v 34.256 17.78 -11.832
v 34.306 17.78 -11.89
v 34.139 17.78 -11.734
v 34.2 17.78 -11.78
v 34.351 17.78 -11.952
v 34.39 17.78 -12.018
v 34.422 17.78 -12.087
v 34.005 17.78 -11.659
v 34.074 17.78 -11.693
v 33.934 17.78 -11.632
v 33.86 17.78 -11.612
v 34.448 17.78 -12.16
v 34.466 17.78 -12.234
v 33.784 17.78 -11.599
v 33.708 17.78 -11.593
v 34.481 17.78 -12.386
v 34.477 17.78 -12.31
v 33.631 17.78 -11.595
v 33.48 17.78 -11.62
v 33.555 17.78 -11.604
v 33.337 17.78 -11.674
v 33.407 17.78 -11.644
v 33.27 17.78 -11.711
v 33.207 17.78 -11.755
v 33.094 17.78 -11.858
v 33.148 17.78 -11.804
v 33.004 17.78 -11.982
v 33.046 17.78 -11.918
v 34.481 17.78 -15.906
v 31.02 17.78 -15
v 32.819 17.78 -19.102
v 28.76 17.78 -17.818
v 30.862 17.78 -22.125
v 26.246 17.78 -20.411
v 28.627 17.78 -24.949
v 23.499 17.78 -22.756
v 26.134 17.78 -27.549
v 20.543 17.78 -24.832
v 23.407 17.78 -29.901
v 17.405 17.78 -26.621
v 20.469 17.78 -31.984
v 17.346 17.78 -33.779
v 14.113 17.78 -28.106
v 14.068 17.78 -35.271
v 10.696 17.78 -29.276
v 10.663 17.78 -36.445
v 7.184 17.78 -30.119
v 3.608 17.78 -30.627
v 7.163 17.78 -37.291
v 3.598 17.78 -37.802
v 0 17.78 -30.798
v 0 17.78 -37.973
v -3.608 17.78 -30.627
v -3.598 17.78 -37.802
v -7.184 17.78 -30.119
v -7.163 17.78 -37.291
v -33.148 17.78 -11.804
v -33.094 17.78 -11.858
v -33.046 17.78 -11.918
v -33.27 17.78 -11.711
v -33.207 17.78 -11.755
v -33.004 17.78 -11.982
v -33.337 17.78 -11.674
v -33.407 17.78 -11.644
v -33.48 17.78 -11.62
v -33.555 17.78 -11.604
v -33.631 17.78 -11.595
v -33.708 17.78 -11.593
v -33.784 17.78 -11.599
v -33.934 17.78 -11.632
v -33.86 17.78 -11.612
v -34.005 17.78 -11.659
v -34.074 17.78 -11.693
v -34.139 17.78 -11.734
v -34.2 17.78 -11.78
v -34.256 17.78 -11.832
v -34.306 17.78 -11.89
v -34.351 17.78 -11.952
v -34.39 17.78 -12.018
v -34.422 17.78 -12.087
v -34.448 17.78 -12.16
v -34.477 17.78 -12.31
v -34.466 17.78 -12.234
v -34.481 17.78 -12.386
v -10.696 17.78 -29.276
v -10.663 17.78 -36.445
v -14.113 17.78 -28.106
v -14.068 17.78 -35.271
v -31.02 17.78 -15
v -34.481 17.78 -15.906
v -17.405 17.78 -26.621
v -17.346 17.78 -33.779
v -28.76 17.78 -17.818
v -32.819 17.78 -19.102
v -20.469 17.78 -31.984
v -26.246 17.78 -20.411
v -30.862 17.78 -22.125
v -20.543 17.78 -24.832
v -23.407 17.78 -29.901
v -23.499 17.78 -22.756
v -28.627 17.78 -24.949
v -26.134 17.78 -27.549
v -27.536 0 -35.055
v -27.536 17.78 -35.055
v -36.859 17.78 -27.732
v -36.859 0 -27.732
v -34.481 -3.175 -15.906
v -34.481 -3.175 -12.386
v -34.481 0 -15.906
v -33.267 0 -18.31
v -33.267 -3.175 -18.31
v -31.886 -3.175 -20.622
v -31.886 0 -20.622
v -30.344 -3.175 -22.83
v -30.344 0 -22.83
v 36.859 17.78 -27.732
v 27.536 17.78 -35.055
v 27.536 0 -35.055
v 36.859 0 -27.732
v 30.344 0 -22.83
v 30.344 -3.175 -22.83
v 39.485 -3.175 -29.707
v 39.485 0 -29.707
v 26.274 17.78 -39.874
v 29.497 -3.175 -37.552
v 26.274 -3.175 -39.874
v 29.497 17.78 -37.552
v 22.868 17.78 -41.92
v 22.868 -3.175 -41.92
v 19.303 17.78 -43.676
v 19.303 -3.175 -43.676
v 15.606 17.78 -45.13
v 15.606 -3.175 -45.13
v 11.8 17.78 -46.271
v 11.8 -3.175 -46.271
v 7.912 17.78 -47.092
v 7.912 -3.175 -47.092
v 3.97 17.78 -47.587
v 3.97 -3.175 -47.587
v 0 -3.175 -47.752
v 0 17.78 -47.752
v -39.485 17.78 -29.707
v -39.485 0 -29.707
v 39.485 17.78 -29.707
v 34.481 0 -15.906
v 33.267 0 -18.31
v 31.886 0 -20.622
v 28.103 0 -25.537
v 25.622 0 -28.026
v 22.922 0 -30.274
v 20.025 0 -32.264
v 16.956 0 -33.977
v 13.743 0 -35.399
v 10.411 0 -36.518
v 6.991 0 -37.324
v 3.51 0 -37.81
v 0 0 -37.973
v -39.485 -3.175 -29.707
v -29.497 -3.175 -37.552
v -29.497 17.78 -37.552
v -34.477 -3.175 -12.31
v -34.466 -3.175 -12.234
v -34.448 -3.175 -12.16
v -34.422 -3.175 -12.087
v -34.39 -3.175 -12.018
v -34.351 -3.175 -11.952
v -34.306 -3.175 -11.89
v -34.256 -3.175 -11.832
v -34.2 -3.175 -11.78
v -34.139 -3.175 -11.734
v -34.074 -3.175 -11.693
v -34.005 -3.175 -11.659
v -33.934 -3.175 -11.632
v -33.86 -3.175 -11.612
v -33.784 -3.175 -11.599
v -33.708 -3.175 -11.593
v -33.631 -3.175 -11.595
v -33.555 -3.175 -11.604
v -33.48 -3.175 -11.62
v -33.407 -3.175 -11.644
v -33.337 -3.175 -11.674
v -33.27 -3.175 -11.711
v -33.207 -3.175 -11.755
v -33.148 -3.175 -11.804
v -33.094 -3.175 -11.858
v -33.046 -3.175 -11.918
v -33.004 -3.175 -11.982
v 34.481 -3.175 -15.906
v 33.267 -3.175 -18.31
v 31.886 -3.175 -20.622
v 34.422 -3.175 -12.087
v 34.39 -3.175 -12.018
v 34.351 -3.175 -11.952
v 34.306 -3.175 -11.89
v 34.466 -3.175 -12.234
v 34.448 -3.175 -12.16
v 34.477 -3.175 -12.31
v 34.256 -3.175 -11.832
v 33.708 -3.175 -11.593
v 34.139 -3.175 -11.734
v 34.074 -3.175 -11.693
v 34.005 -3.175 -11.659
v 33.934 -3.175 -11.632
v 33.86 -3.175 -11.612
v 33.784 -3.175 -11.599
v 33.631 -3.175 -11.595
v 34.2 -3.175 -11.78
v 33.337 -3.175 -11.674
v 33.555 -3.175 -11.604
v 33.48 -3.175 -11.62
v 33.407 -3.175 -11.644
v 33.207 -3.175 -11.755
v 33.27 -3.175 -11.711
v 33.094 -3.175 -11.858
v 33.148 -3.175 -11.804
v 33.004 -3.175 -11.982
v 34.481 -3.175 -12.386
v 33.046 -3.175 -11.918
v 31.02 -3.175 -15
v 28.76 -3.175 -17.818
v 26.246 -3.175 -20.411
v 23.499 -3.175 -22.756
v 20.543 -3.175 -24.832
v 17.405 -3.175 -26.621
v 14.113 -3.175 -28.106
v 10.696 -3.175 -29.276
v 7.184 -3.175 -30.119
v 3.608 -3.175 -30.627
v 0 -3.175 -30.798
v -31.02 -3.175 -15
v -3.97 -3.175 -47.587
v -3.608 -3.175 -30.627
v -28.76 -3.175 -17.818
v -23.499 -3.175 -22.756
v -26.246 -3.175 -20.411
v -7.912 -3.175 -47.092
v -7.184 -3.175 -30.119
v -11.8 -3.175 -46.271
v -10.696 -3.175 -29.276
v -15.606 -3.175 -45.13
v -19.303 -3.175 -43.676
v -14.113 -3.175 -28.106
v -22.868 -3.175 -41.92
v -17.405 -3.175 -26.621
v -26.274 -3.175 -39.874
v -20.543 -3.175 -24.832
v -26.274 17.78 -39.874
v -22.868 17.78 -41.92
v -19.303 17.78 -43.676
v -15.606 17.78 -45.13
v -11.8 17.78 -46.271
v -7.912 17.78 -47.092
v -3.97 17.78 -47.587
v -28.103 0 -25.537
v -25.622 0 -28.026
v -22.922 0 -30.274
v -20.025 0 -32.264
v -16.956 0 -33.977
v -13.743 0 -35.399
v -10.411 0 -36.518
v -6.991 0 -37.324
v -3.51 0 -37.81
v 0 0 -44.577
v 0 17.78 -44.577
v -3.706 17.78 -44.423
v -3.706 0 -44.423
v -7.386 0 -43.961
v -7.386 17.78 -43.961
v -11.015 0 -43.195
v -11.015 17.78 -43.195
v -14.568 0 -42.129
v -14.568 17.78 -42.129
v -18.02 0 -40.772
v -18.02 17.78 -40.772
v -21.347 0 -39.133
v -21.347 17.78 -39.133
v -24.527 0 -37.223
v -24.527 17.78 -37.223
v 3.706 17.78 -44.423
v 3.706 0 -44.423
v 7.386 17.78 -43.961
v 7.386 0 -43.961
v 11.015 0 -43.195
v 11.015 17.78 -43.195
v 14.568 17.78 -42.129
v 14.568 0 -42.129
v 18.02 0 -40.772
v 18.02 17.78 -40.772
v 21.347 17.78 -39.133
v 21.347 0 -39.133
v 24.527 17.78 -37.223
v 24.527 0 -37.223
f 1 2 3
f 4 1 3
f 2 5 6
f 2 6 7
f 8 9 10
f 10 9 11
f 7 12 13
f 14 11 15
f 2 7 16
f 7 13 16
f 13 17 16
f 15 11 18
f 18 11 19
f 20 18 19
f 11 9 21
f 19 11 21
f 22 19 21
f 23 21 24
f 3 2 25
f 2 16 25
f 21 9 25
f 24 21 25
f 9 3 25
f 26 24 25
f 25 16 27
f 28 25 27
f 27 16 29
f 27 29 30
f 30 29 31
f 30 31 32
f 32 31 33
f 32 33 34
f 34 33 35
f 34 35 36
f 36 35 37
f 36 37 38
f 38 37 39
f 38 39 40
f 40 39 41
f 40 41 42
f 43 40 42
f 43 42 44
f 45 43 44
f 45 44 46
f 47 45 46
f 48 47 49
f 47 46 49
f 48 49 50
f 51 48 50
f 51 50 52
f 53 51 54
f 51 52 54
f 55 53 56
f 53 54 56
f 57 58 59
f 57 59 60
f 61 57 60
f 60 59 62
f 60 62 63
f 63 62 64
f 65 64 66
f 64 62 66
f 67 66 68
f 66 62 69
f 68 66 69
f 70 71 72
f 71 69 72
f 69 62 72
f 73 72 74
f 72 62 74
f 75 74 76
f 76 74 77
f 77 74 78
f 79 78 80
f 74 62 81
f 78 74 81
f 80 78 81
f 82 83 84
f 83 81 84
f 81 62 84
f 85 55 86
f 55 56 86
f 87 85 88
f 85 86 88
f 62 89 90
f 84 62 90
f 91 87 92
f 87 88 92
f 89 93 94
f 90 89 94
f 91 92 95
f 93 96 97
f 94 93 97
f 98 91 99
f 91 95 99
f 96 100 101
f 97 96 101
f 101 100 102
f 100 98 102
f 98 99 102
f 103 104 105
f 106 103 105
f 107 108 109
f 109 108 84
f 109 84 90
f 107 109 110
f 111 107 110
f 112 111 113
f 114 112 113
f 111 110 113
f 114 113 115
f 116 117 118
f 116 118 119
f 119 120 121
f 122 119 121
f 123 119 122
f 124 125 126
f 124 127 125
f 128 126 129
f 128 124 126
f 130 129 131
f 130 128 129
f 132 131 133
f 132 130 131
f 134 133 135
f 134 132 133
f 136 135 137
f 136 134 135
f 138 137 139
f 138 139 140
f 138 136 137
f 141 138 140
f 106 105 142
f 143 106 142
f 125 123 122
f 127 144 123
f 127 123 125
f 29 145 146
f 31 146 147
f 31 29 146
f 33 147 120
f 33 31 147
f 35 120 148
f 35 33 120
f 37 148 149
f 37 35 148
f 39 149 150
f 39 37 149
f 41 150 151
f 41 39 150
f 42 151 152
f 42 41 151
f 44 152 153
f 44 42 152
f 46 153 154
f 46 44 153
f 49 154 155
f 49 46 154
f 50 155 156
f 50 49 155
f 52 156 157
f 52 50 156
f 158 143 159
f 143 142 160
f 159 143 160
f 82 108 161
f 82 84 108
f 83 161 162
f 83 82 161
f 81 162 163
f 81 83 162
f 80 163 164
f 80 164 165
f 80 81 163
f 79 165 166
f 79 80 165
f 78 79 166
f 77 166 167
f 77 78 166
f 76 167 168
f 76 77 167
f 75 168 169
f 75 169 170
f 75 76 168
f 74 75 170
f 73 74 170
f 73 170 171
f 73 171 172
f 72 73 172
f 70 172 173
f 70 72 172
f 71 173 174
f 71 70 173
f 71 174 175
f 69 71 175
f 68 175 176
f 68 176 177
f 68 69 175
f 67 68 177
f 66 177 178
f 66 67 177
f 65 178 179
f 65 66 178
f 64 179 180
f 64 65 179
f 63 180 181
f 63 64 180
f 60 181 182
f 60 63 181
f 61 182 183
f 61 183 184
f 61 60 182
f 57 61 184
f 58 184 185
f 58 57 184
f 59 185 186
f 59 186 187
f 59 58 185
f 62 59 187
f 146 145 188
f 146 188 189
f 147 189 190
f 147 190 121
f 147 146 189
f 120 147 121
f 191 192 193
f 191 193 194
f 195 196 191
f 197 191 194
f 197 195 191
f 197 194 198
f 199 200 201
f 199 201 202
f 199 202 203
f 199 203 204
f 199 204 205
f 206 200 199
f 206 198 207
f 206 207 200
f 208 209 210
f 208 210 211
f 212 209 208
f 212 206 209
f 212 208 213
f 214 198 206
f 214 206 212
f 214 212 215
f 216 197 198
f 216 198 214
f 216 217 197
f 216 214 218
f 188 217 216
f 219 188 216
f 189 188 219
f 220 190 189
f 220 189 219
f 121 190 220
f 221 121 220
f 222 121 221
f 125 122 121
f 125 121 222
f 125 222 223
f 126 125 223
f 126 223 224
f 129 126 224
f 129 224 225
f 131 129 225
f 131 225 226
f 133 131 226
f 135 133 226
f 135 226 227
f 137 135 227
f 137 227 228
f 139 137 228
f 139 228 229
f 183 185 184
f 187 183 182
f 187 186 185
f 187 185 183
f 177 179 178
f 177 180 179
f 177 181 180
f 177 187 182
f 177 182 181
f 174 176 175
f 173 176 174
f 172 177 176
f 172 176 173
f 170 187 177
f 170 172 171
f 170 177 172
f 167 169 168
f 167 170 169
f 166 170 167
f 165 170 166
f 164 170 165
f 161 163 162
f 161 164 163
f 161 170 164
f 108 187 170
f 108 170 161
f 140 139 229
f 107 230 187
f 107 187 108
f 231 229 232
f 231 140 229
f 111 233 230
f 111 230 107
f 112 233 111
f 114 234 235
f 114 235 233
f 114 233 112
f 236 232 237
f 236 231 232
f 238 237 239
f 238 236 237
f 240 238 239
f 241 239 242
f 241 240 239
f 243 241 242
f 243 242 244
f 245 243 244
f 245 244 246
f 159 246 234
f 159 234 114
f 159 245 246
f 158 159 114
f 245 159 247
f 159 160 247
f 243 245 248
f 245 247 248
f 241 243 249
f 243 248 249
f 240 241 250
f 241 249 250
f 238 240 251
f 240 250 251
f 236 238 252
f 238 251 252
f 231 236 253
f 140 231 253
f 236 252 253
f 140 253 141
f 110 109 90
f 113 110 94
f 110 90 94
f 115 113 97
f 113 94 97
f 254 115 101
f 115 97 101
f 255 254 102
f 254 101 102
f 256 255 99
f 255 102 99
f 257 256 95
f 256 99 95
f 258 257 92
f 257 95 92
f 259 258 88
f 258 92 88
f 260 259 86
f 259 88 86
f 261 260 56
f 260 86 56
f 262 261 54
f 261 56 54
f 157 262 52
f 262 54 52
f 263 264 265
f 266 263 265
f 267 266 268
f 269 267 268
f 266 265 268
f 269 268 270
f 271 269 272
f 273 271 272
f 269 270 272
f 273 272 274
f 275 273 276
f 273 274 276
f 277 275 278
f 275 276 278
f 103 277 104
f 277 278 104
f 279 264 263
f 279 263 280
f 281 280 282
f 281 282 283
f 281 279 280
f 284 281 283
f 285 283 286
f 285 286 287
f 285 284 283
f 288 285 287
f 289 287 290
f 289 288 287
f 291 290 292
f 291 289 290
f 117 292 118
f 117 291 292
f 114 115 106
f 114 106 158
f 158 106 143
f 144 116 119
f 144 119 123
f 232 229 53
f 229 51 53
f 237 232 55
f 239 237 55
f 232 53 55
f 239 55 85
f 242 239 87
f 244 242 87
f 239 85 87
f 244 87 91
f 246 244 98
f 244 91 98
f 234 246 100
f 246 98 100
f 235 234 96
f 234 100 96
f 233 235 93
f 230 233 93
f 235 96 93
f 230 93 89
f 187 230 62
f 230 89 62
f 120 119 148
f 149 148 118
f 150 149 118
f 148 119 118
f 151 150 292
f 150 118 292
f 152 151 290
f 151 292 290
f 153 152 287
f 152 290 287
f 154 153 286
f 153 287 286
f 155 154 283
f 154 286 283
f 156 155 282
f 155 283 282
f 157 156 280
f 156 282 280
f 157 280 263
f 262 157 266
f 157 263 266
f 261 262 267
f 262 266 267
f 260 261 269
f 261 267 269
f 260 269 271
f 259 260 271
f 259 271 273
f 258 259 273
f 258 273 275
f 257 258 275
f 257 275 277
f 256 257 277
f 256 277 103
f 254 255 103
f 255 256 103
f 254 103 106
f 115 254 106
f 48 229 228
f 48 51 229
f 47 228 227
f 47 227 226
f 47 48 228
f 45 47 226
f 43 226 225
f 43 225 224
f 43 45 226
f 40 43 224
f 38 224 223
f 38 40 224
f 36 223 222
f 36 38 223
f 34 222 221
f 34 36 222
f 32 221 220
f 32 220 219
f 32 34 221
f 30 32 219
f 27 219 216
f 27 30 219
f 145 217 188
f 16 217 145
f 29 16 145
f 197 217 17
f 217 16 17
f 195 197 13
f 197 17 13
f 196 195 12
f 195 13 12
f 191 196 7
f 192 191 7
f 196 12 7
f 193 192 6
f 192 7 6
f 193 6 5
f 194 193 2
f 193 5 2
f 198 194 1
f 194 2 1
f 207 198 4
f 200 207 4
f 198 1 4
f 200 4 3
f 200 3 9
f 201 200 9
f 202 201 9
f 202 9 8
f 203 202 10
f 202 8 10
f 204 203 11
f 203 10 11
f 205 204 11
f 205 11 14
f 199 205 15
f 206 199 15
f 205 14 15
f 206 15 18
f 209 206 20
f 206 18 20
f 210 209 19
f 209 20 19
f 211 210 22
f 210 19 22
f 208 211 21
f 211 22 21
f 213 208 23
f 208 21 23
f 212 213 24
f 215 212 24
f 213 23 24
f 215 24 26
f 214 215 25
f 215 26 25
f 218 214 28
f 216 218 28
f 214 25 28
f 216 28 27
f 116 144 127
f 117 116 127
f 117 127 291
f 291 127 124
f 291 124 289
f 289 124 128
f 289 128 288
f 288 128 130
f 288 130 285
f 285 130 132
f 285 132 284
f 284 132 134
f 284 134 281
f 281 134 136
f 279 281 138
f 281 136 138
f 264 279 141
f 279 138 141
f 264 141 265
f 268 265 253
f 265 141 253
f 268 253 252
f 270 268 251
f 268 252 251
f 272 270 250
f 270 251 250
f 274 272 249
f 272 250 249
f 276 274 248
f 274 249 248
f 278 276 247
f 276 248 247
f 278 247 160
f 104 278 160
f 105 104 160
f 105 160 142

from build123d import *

# Parameters (mm, degrees)
BOSS_EXTRUDE1_DEPTH = 3.175
BOSS_EXTRUDE2_START = 17.78
BOSS_EXTRUDE2_DEPTH = 17.78
FILLET1_R           = 0.79375


with BuildPart() as part:
    # Sketch2 → Boss-Extrude1 (new body)
    with BuildSketch(Plane(origin=(0, 0, 0), x_dir=(1, 0, 0), z_dir=(0, 1, 0))):
        with BuildLine():
            ThreePointArc((0, 30.7975), (20.332846129, 24.964334619), (34.480947296, 9.239141982))
            Line((34.480947296, 9.239141982), (34.480947296, 15.906382448))
            ThreePointArc((34.480947296, 15.906382448), (32.596761403, 19.478189726), (30.343916909, 22.829705114))
            Line((30.343916909, 22.829705114), (39.484711098, 29.70691996))
            Line((39.484711098, 29.70691996), (29.497478634, 37.551994065))
            ThreePointArc((29.497478634, 37.551994065), (15.605618915, 45.130013985), (0, 47.752))
            Line((0, 47.752), (0, 30.7975))
        make_face()
    extrude(amount=-BOSS_EXTRUDE1_DEPTH)

    # Sketch2<3> → Boss-Extrude2 (add)
    with BuildSketch(Plane(origin=(0, 0, 0), x_dir=(1, 0, 0), z_dir=(0, 1, 0)).offset(BOSS_EXTRUDE2_START)):
        with BuildLine():
            Line((0, 37.973), (0, 30.7975))
            ThreePointArc((0, 30.7975), (20.332846129, 24.964334619), (34.480947296, 9.239141982))
            Line((34.480947296, 9.239141982), (34.480947296, 15.906382448))
            ThreePointArc((34.480947296, 15.906382448), (20.468703773, 31.984072518), (0, 37.973))
        make_face()
        with BuildLine():
            Line((0, 47.752), (0, 44.577))
            ThreePointArc((0, 44.577), (14.568011274, 42.129348162), (27.536210108, 35.055185949))
            Line((27.536210108, 35.055185949), (36.85939786, 27.731725813))
            Line((36.85939786, 27.731725813), (39.484711098, 29.70691996))
            Line((39.484711098, 29.70691996), (29.497478634, 37.551994065))
            ThreePointArc((29.497478634, 37.551994065), (15.605618915, 45.130013985), (0, 47.752))
        make_face()
    extrude(amount=-BOSS_EXTRUDE2_DEPTH)

    # Fillet1
    fillet1_edges = [part.edges().sort_by_distance(p)[0] for p in [
        (34.480947296, 7.3025, -9.239141982),
    ]]
    fillet(fillet1_edges, radius=FILLET1_R)

    # Mirror1: part across plane


with BuildPart() as part_1:
    add(part.part)
    add(part.part.mirror(Plane(origin=(0, -3.175, 0), x_dir=(0, 0, 1), z_dir=(1, 0, 0))))


solid = part_1.part
